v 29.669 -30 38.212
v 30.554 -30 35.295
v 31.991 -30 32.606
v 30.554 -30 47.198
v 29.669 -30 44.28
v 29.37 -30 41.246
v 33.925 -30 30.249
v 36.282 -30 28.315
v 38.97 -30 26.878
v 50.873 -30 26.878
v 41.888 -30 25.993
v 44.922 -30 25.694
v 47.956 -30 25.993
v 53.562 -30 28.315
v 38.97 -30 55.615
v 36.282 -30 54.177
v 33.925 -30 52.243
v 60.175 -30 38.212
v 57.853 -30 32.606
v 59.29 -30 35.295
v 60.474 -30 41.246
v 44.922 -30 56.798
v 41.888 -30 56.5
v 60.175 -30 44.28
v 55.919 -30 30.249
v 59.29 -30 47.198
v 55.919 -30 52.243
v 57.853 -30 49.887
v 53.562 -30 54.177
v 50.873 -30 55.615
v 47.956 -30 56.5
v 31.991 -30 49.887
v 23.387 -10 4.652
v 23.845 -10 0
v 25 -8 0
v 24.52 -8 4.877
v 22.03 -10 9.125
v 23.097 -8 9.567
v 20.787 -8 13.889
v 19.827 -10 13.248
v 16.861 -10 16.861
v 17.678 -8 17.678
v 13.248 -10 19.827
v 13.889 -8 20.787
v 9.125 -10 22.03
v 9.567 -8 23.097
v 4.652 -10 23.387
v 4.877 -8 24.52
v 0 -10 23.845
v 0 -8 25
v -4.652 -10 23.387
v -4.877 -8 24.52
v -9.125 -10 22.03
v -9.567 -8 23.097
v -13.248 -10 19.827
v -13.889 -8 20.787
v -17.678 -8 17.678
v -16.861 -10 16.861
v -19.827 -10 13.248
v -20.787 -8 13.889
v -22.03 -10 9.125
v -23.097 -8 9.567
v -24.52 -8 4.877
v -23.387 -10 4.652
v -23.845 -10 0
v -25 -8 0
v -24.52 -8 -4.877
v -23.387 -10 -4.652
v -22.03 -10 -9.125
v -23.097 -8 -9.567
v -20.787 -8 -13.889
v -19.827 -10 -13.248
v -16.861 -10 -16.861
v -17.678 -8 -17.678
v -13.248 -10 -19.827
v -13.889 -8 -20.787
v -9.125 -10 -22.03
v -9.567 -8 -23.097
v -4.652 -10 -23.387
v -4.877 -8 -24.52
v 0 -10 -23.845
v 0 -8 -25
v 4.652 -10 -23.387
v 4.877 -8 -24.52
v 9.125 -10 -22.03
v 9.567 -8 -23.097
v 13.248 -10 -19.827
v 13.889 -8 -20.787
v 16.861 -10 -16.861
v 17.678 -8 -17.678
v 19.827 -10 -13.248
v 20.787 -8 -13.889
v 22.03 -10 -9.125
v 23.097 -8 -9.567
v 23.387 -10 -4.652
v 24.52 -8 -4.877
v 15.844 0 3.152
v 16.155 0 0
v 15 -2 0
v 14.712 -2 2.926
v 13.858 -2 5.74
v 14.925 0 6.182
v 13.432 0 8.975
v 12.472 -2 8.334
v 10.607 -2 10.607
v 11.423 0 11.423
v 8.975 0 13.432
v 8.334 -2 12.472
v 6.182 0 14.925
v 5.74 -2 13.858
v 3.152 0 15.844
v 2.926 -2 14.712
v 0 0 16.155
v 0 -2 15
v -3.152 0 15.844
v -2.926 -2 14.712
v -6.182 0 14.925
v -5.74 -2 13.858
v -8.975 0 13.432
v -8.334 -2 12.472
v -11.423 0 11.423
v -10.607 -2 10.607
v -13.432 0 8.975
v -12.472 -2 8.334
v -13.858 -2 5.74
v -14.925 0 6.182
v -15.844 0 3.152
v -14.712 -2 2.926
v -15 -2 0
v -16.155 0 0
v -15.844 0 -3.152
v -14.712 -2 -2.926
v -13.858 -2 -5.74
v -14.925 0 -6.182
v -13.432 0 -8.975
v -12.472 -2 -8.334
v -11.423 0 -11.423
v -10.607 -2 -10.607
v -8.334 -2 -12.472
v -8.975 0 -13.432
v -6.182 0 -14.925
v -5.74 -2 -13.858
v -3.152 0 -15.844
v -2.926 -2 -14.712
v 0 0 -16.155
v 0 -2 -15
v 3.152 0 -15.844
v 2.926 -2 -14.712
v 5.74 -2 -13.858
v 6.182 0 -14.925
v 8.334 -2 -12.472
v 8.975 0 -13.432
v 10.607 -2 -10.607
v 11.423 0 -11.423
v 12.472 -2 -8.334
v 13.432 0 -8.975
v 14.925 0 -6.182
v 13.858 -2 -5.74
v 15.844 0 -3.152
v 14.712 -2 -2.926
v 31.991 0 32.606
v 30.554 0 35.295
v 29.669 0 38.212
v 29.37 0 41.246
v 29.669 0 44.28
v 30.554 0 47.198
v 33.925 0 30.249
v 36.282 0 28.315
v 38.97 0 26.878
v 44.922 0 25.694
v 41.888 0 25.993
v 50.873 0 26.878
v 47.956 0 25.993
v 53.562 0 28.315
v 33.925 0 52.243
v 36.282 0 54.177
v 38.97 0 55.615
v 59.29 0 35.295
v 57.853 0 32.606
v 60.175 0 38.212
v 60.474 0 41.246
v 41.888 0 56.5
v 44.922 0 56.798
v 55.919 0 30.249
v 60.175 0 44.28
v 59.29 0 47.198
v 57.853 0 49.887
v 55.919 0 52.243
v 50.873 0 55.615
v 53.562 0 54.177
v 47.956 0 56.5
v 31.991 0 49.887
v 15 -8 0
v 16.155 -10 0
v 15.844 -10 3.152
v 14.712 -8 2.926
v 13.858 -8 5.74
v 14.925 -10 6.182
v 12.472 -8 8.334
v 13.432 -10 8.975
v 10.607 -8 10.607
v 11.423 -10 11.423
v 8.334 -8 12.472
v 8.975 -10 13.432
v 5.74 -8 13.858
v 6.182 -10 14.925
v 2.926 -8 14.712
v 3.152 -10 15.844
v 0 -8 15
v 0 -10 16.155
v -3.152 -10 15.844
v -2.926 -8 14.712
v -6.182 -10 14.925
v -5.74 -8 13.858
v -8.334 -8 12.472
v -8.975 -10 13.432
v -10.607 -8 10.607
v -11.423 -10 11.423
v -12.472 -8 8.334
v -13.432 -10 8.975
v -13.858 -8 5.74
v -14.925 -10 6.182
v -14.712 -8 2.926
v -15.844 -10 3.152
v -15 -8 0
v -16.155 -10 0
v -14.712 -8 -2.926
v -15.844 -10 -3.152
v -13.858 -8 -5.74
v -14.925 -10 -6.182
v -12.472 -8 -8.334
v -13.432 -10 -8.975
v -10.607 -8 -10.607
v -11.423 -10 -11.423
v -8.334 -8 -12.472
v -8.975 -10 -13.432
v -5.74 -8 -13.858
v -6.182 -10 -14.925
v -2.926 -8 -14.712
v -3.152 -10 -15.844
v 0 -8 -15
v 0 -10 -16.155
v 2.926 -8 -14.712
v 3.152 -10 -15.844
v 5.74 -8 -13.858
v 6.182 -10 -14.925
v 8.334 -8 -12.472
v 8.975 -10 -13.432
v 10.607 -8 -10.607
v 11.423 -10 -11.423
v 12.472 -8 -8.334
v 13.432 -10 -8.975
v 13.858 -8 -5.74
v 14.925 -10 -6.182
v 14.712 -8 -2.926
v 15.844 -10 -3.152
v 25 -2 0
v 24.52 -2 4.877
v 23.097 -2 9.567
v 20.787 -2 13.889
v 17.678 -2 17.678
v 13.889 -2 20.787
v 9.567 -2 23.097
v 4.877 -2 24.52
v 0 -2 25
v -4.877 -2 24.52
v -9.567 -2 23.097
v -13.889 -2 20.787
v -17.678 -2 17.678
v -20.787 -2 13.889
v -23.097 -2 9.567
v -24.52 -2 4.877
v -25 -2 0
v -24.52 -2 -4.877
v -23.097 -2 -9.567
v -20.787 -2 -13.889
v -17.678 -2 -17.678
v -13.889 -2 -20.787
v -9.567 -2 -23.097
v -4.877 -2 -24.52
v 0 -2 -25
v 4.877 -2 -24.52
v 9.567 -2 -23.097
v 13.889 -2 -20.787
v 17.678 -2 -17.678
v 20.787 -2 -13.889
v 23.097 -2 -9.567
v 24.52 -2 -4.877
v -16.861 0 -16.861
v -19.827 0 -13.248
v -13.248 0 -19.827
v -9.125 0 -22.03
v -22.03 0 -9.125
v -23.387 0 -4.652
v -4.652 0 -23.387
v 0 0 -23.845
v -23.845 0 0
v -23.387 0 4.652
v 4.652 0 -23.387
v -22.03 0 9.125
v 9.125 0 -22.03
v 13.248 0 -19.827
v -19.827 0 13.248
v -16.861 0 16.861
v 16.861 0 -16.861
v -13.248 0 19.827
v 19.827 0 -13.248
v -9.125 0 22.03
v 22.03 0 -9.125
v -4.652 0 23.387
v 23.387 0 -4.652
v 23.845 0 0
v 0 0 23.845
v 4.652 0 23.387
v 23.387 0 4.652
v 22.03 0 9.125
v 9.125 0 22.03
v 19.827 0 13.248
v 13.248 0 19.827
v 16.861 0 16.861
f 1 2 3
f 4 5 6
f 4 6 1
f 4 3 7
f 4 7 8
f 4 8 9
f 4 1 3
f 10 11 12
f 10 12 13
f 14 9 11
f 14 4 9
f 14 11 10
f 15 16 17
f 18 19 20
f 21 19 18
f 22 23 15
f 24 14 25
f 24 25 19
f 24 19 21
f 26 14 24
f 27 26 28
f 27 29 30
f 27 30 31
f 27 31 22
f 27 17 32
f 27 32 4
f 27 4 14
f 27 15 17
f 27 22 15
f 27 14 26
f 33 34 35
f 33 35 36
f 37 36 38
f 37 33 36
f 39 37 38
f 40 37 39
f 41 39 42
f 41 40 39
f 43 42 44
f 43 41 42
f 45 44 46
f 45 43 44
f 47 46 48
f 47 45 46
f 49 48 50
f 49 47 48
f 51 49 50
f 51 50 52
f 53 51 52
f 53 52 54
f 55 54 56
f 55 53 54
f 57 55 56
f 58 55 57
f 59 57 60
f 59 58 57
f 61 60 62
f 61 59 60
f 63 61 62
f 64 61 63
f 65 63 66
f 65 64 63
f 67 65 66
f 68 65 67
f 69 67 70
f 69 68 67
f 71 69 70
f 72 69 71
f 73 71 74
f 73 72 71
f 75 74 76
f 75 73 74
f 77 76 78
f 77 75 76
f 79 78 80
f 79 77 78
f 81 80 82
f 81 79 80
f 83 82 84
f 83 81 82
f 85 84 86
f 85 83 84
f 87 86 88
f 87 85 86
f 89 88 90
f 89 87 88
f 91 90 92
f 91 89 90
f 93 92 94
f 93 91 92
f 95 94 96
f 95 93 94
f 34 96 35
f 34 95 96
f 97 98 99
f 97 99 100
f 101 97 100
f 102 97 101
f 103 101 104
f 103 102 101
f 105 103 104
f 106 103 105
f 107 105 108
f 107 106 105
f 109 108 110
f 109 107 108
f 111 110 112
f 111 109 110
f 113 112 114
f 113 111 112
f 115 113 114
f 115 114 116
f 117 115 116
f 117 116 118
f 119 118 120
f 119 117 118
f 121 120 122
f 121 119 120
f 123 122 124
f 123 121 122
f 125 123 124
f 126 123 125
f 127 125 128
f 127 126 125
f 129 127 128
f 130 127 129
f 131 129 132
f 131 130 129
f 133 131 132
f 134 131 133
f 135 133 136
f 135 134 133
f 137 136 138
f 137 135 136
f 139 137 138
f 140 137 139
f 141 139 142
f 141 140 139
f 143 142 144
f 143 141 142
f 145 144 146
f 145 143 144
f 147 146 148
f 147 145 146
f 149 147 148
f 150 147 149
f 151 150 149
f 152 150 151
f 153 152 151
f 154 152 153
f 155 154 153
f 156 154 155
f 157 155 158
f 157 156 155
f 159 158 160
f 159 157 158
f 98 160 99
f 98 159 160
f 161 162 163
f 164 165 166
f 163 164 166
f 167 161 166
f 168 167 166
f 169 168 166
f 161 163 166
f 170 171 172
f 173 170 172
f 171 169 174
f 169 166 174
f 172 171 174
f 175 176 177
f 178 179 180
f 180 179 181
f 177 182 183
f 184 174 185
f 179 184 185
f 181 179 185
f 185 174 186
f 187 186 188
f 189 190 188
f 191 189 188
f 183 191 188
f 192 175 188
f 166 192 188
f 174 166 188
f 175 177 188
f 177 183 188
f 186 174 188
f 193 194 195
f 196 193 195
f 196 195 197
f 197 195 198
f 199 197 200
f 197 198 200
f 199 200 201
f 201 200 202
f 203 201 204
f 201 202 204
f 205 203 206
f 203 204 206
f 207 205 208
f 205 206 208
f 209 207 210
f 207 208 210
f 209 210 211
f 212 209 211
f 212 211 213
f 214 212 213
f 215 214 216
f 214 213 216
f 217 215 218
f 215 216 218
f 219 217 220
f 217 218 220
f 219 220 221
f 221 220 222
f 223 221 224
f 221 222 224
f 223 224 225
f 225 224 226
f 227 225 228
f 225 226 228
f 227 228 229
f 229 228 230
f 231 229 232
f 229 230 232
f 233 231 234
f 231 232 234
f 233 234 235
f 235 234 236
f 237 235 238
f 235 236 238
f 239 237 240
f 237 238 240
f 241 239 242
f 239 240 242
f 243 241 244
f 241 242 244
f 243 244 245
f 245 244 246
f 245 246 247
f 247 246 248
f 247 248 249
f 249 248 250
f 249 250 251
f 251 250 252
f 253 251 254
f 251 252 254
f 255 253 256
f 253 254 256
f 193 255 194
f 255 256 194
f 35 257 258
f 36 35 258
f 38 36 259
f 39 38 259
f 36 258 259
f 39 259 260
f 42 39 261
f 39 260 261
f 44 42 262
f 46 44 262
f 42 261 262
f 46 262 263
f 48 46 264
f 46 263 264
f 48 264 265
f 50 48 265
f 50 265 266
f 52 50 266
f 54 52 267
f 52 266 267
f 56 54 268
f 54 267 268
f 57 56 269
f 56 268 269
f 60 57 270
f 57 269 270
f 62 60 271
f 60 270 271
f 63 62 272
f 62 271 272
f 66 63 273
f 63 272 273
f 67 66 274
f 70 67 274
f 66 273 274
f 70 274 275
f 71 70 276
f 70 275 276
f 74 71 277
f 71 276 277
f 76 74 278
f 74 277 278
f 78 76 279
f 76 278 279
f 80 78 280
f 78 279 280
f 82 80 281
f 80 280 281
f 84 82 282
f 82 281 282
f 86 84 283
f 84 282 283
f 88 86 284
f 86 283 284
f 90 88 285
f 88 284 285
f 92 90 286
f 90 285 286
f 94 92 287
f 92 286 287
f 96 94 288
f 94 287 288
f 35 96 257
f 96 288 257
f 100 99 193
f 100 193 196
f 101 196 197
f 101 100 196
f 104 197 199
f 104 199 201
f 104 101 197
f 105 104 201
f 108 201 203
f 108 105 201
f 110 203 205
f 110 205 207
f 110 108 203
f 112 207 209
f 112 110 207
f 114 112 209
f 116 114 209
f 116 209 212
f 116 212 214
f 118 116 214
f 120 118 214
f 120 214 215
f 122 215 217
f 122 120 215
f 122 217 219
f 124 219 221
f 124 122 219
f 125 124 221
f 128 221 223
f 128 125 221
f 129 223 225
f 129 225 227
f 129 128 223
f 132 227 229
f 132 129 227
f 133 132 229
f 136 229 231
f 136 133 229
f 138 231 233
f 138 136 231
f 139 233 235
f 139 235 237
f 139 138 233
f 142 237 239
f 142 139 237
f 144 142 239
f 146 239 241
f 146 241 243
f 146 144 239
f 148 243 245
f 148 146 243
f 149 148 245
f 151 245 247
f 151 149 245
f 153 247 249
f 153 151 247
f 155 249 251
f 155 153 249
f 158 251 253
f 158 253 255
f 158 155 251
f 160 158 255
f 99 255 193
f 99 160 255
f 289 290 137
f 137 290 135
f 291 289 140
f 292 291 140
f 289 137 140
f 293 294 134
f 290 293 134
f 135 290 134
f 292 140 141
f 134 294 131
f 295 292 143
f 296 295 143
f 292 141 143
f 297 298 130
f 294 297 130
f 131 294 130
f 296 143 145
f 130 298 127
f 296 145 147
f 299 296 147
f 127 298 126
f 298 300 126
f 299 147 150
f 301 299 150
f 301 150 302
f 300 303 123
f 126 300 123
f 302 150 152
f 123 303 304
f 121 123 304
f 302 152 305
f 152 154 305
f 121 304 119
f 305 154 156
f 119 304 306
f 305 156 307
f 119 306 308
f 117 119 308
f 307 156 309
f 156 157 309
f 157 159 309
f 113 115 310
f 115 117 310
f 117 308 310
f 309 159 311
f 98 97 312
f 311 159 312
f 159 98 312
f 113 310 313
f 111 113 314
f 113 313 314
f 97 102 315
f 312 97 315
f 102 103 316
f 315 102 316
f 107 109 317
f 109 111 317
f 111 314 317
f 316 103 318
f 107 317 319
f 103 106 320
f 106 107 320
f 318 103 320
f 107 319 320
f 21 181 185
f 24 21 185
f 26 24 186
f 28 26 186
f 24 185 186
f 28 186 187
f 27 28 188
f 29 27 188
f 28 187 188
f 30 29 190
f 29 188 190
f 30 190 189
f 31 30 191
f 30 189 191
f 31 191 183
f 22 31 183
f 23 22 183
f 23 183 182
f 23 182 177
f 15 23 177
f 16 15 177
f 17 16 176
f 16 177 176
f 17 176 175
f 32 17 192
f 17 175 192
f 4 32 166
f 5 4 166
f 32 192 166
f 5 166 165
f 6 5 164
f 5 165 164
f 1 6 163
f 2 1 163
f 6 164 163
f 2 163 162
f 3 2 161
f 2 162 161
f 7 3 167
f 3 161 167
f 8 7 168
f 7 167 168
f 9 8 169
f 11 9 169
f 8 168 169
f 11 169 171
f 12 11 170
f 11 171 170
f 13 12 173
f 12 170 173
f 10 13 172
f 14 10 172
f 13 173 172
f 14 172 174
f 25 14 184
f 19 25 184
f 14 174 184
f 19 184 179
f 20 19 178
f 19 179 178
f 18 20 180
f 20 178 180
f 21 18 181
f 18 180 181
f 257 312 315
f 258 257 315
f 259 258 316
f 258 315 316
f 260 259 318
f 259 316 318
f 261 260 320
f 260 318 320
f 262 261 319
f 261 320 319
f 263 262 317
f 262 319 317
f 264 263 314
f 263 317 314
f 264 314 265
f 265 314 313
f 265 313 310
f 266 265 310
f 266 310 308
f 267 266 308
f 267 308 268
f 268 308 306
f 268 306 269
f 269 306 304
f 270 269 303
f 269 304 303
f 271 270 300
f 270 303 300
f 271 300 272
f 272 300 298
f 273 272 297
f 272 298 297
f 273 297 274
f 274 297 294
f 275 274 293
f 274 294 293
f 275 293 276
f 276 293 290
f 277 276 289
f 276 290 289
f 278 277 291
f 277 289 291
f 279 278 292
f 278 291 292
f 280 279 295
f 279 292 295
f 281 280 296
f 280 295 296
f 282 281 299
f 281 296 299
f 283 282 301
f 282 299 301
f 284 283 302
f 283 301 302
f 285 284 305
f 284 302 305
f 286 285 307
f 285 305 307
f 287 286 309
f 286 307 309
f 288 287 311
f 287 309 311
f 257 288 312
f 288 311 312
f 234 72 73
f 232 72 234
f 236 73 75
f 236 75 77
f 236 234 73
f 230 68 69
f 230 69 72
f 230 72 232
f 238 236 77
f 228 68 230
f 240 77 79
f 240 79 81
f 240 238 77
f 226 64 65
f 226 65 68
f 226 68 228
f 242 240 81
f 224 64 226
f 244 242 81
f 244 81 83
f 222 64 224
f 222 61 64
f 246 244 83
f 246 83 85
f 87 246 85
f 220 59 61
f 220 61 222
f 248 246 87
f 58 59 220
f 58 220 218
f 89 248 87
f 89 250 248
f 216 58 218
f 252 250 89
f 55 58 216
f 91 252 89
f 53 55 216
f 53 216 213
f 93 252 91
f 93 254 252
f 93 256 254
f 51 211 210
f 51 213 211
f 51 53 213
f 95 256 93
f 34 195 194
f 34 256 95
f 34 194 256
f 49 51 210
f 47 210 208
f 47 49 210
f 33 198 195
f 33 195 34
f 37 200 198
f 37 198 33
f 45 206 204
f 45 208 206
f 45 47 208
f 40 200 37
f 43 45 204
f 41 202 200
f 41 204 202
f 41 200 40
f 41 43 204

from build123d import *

# Parameters (mm, degrees)
F0_R     = 25
F0_R_2   = 15
F1_DEPTH = 10
F2_SIZE2 = 1.154701
F2_SIZE  = 2
F3_R     = 15.551975
F4_DEPTH = 30


with BuildPart() as f1:
    # F0 (on Front) → F1 (new body)
    with BuildSketch(Plane.XZ):
        Circle(F0_R)
        Circle(F0_R_2, mode=Mode.SUBTRACT)
    extrude(amount=F1_DEPTH)

    # F2
    f2_edges = [f1.edges().sort_by_distance(p)[0] for p in [
        (-25, 0, 0),
        (-15, 0, 0),
        (-25, -10, 0),
        (-15, -10, 0),
    ]]
    chamfer(f2_edges, length=F2_SIZE, length2=F2_SIZE2)


with BuildPart() as f4:
    # F3 (on Front) → F4 (new body)
    with BuildSketch(Plane.XZ):
        with Locations((44.921815, 41.246399)):
            Circle(F3_R)
    extrude(amount=F4_DEPTH)


solid = Compound([f1.part, f4.part])
